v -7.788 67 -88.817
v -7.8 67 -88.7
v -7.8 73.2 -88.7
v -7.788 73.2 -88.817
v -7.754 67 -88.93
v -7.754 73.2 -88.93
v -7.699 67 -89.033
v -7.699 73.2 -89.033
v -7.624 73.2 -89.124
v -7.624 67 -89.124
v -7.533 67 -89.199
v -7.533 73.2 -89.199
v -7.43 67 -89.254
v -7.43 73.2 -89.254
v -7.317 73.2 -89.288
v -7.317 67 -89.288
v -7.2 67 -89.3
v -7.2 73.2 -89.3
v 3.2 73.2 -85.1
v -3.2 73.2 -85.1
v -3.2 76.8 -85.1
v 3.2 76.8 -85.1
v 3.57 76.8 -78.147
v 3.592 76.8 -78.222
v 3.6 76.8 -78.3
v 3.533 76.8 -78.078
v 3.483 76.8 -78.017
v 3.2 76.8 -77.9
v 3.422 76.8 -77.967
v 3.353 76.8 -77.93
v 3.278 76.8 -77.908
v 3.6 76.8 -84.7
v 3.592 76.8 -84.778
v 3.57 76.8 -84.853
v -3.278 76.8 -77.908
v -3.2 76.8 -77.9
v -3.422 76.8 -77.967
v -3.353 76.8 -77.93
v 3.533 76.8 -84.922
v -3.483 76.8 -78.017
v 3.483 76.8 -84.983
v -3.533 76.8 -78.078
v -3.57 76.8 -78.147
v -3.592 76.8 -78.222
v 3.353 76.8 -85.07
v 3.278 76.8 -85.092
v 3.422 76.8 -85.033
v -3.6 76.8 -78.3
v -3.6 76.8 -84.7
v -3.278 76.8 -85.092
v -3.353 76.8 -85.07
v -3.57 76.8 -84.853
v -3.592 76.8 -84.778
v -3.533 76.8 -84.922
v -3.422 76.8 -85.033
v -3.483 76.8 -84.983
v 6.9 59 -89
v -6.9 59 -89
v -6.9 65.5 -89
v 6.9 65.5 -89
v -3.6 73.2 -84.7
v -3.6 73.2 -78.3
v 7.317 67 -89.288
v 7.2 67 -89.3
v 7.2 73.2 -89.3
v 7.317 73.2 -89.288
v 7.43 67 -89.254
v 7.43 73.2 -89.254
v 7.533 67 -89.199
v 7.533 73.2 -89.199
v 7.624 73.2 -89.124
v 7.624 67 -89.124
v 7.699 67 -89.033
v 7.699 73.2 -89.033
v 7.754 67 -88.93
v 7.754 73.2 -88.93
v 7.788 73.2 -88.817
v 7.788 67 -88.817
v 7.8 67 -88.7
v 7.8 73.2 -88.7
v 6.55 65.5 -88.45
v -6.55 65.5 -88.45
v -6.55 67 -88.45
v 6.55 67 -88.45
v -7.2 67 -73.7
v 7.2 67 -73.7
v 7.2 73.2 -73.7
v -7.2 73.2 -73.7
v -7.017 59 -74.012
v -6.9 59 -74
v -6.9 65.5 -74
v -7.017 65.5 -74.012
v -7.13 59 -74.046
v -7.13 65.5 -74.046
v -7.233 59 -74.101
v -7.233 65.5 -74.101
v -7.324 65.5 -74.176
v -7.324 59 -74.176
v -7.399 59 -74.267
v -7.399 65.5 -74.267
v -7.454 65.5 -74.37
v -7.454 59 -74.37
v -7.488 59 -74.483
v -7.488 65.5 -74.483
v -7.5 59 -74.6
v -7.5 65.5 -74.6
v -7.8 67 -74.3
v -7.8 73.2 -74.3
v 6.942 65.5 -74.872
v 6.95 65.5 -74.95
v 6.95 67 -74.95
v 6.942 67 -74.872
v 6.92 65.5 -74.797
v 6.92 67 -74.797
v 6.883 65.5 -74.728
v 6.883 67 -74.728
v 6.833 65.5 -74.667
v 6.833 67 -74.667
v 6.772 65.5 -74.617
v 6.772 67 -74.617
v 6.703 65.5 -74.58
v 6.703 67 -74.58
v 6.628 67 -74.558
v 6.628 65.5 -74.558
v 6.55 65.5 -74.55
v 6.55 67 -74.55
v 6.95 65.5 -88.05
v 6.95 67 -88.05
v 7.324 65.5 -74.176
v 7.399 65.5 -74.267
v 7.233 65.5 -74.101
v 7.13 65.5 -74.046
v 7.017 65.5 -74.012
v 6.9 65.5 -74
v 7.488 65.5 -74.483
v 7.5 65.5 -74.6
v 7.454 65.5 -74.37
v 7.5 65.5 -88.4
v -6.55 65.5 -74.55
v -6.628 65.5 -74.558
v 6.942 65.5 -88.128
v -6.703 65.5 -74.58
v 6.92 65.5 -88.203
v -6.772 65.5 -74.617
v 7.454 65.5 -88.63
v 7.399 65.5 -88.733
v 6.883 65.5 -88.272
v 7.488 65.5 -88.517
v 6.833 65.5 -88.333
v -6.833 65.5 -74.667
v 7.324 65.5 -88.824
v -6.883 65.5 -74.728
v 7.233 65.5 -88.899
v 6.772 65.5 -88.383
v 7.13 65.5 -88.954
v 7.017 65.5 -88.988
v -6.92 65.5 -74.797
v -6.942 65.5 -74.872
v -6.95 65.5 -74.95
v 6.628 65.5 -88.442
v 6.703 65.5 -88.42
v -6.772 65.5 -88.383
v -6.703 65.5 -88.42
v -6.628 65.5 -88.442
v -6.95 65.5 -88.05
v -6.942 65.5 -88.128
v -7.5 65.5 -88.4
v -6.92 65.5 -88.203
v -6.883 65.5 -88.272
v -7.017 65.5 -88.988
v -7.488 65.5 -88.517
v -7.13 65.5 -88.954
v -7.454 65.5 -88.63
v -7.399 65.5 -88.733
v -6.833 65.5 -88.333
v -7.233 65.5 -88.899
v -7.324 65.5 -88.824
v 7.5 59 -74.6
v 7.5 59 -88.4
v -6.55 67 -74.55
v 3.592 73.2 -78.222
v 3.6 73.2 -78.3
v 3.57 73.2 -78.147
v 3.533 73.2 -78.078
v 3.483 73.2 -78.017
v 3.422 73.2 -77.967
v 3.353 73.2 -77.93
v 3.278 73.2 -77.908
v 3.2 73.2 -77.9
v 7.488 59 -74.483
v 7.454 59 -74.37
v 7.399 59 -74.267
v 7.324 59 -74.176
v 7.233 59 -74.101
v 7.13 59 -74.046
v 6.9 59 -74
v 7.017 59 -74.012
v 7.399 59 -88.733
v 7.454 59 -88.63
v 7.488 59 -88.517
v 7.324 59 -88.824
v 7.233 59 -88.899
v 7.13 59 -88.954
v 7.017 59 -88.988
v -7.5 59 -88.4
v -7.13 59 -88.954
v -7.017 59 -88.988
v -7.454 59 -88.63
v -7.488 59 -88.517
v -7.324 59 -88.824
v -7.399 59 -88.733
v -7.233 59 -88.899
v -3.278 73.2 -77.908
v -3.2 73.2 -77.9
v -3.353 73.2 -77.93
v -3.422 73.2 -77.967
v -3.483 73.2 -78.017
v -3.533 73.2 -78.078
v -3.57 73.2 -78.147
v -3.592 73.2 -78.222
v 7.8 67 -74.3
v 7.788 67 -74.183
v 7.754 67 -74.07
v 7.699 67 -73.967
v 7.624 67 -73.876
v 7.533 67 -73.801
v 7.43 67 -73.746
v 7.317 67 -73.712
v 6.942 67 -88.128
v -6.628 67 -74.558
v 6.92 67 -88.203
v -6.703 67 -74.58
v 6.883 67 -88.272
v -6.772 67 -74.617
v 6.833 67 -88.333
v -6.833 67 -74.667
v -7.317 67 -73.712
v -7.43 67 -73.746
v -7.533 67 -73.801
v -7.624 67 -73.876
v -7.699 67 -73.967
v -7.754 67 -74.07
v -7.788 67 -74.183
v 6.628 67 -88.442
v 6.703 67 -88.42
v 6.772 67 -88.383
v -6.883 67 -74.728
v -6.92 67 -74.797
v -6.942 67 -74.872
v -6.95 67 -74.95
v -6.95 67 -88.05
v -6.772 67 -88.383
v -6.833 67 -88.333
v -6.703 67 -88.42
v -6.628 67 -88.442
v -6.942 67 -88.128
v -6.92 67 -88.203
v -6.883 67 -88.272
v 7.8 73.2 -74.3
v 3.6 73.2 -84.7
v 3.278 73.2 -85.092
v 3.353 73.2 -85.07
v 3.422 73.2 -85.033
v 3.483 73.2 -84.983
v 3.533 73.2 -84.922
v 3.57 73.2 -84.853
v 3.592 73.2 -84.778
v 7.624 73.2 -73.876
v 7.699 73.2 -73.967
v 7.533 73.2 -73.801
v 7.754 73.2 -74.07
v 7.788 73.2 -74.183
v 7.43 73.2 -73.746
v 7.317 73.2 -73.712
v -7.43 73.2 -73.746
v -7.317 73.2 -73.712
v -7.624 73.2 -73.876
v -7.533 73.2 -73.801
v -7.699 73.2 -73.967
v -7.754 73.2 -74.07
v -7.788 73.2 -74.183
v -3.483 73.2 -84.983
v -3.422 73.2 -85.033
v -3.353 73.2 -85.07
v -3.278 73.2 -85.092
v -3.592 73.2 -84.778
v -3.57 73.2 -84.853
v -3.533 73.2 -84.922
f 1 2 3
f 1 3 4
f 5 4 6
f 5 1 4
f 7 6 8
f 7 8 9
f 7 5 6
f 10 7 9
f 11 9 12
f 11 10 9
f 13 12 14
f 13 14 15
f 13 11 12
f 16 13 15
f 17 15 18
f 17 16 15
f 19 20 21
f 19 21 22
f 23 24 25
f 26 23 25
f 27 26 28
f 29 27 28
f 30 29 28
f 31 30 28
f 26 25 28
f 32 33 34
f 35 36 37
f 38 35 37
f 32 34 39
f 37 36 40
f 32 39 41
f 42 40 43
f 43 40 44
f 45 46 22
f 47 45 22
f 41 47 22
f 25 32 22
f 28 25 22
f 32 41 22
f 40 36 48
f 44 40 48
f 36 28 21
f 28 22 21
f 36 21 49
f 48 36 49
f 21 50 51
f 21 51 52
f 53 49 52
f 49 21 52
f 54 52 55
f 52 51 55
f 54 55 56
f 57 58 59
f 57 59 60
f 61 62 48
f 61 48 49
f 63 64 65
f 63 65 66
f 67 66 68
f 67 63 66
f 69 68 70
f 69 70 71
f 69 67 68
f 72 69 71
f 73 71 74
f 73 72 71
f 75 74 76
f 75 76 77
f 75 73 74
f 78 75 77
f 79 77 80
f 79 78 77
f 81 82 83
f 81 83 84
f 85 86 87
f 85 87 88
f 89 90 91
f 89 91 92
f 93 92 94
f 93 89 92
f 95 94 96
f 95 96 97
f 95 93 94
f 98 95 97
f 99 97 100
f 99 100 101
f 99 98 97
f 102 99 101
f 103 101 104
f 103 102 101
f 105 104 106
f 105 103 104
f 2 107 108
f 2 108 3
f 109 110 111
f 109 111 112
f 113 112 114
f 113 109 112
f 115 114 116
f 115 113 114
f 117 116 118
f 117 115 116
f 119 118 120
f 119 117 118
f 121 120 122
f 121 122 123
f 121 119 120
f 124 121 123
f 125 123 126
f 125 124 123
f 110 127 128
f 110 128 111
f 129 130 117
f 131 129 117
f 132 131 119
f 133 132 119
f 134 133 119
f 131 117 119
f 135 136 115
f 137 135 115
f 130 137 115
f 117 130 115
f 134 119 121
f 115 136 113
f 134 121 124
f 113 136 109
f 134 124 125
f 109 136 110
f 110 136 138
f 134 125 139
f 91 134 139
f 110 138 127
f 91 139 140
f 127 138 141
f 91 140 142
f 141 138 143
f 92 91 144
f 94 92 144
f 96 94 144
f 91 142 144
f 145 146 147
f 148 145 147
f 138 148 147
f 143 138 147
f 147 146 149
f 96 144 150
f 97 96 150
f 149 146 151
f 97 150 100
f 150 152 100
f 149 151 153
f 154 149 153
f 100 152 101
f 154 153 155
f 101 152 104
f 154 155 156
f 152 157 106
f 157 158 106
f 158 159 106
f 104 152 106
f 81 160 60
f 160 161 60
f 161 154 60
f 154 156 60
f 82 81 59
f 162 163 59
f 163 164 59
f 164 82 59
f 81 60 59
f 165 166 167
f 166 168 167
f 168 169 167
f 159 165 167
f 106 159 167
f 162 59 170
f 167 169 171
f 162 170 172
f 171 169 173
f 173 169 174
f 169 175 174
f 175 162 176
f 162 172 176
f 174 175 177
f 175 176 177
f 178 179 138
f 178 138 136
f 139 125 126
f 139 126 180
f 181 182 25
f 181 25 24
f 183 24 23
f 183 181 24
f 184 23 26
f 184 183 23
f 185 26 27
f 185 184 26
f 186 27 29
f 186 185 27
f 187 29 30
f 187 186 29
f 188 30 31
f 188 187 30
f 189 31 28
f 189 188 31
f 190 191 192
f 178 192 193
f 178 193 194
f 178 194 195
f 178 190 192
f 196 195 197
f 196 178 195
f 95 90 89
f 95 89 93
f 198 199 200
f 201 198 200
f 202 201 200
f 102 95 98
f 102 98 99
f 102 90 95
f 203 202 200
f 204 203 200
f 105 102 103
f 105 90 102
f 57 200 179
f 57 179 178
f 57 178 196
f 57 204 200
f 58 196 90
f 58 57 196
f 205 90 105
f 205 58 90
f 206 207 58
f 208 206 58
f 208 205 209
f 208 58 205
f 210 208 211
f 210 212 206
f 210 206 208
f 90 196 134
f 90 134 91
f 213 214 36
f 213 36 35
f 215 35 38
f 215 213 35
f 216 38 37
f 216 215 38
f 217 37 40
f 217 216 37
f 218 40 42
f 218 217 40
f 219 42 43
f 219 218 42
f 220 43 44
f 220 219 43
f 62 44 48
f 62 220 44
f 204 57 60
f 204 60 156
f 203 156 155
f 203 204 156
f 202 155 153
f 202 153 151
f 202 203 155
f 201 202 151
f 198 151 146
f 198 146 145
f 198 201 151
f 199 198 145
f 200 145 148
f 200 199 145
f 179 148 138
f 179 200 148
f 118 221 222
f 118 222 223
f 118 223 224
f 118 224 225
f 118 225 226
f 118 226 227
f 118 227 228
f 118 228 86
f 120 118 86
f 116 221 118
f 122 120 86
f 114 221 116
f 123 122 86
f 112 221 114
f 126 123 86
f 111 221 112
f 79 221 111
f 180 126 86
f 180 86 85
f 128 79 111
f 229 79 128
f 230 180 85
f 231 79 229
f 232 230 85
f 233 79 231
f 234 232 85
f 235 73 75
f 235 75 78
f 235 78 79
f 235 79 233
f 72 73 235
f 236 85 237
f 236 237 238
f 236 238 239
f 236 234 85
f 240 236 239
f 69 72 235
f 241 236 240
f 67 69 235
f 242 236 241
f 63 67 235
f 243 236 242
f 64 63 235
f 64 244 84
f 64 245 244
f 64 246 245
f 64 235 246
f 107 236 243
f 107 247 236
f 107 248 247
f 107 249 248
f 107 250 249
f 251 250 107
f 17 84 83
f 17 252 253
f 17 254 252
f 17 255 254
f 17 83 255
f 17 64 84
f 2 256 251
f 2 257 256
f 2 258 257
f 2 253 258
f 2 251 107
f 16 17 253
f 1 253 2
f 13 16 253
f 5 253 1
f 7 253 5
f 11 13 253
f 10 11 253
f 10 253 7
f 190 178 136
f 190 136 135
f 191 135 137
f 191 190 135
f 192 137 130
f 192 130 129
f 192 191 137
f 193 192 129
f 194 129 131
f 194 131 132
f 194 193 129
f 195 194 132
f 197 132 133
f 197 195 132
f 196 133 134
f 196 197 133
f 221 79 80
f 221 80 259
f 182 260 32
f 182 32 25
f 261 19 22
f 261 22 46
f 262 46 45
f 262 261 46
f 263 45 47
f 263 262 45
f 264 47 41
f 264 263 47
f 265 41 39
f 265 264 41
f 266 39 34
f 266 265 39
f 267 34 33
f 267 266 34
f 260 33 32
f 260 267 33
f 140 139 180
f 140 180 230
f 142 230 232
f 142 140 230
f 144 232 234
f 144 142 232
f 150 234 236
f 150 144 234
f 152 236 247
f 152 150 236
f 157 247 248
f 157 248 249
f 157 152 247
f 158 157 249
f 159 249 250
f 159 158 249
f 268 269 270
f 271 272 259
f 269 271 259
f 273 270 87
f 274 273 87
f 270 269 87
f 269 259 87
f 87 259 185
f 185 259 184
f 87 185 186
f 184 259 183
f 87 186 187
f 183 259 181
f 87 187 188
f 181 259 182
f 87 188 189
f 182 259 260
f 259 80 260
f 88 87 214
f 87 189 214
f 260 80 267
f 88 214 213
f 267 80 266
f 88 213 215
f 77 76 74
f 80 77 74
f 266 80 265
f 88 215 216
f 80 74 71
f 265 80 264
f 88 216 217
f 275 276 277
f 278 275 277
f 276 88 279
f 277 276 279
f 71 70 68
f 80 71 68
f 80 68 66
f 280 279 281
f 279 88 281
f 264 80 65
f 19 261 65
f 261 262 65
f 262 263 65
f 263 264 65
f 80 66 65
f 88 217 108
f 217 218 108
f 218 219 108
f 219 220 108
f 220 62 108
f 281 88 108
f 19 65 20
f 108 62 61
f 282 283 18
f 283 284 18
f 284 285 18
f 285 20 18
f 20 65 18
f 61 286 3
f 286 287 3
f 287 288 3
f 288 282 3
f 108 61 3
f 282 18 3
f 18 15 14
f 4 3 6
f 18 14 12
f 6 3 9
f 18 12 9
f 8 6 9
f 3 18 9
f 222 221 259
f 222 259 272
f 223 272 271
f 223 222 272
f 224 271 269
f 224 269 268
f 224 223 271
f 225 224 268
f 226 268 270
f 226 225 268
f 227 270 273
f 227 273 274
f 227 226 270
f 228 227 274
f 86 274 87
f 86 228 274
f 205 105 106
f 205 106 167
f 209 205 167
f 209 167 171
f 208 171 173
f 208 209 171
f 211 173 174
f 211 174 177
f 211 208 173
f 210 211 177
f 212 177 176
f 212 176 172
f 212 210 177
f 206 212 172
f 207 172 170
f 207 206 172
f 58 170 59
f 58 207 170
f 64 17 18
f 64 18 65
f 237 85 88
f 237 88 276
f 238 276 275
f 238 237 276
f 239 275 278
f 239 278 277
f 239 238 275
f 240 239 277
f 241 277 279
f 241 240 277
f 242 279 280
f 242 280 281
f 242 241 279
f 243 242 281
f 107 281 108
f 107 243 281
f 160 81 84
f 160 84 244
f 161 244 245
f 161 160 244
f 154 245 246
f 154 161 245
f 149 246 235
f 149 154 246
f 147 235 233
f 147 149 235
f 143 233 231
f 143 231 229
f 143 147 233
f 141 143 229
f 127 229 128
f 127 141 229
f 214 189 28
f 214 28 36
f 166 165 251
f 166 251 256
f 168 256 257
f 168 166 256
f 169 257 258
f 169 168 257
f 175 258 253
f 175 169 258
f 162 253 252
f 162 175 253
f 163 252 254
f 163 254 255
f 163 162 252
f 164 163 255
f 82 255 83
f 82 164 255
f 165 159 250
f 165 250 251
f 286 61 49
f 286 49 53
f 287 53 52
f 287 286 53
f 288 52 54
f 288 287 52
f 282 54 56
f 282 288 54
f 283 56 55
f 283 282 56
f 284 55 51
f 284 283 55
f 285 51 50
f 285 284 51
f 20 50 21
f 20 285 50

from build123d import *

# Parameters (mm, degrees)
UPPER_START = 67
UPPER_DEPTH = 6.2
NECK_START  = 65.5
NECK_DEPTH  = 1.7
BODY_START  = 59
BODY_DEPTH  = 6.5
STEM_START  = 73.2
STEM_DEPTH  = 3.6


with BuildPart() as part:
    # Sketch1 → Upper (new body)
    with BuildSketch(Plane(origin=(0, 0, 0), x_dir=(1, 0, 0), z_dir=(0, 1, 0)).offset(UPPER_START)):
        with BuildLine():
            Line((-7.2, 89.3), (7.2, 89.3))
            ThreePointArc((7.2, 89.3), (7.624264069, 89.124264069), (7.8, 88.7))
            Line((7.8, 88.7), (7.8, 74.3))
            ThreePointArc((7.8, 74.3), (7.624264069, 73.875735931), (7.2, 73.7))
            Line((7.2, 73.7), (-7.2, 73.7))
            ThreePointArc((-7.2, 73.7), (-7.624264069, 73.875735931), (-7.8, 74.3))
            Line((-7.8, 74.3), (-7.8, 88.7))
            ThreePointArc((-7.8, 88.7), (-7.624264069, 89.124264069), (-7.2, 89.3))
        make_face()
    extrude(amount=UPPER_DEPTH)

    # Sketch2 → Neck (add)
    with BuildSketch(Plane(origin=(0, 0, 0), x_dir=(1, 0, 0), z_dir=(0, 1, 0)).offset(NECK_START)):
        with BuildLine():
            Line((-6.55, 88.45), (6.55, 88.45))
            ThreePointArc((6.55, 88.45), (6.832842712, 88.332842712), (6.95, 88.05))
            Line((6.95, 88.05), (6.95, 74.95))
            ThreePointArc((6.95, 74.95), (6.832842712, 74.667157288), (6.55, 74.55))
            Line((6.55, 74.55), (-6.55, 74.55))
            ThreePointArc((-6.55, 74.55), (-6.832842712, 74.667157288), (-6.95, 74.95))
            Line((-6.95, 74.95), (-6.95, 88.05))
            ThreePointArc((-6.95, 88.05), (-6.832842712, 88.332842712), (-6.55, 88.45))
        make_face()
    extrude(amount=NECK_DEPTH)

    # Sketch3 → Body (add)
    with BuildSketch(Plane(origin=(0, 0, 0), x_dir=(1, 0, 0), z_dir=(0, 1, 0)).offset(BODY_START)):
        with BuildLine():
            Line((-6.9, 89), (6.9, 89))
            ThreePointArc((6.9, 89), (7.324264069, 88.824264069), (7.5, 88.4))
            Line((7.5, 88.4), (7.5, 74.6))
            ThreePointArc((7.5, 74.6), (7.324264069, 74.175735931), (6.9, 74))
            Line((6.9, 74), (-6.9, 74))
            ThreePointArc((-6.9, 74), (-7.324264069, 74.175735931), (-7.5, 74.6))
            Line((-7.5, 74.6), (-7.5, 88.4))
            ThreePointArc((-7.5, 88.4), (-7.324264069, 88.824264069), (-6.9, 89))
        make_face()
    extrude(amount=BODY_DEPTH)

    # Sketch4 → Stem (add)
    with BuildSketch(Plane(origin=(0, 0, 0), x_dir=(1, 0, 0), z_dir=(0, 1, 0)).offset(STEM_START)):
        with BuildLine():
            Line((-3.2, 85.1), (3.2, 85.1))
            ThreePointArc((3.2, 85.1), (3.482842712, 84.982842712), (3.6, 84.7))
            Line((3.6, 84.7), (3.6, 78.3))
            ThreePointArc((3.6, 78.3), (3.482842712, 78.017157288), (3.2, 77.9))
            Line((3.2, 77.9), (-3.2, 77.9))
            ThreePointArc((-3.2, 77.9), (-3.482842712, 78.017157288), (-3.6, 78.3))
            Line((-3.6, 78.3), (-3.6, 84.7))
            ThreePointArc((-3.6, 84.7), (-3.482842712, 84.982842712), (-3.2, 85.1))
        make_face()
    extrude(amount=STEM_DEPTH)


solid = part.part
